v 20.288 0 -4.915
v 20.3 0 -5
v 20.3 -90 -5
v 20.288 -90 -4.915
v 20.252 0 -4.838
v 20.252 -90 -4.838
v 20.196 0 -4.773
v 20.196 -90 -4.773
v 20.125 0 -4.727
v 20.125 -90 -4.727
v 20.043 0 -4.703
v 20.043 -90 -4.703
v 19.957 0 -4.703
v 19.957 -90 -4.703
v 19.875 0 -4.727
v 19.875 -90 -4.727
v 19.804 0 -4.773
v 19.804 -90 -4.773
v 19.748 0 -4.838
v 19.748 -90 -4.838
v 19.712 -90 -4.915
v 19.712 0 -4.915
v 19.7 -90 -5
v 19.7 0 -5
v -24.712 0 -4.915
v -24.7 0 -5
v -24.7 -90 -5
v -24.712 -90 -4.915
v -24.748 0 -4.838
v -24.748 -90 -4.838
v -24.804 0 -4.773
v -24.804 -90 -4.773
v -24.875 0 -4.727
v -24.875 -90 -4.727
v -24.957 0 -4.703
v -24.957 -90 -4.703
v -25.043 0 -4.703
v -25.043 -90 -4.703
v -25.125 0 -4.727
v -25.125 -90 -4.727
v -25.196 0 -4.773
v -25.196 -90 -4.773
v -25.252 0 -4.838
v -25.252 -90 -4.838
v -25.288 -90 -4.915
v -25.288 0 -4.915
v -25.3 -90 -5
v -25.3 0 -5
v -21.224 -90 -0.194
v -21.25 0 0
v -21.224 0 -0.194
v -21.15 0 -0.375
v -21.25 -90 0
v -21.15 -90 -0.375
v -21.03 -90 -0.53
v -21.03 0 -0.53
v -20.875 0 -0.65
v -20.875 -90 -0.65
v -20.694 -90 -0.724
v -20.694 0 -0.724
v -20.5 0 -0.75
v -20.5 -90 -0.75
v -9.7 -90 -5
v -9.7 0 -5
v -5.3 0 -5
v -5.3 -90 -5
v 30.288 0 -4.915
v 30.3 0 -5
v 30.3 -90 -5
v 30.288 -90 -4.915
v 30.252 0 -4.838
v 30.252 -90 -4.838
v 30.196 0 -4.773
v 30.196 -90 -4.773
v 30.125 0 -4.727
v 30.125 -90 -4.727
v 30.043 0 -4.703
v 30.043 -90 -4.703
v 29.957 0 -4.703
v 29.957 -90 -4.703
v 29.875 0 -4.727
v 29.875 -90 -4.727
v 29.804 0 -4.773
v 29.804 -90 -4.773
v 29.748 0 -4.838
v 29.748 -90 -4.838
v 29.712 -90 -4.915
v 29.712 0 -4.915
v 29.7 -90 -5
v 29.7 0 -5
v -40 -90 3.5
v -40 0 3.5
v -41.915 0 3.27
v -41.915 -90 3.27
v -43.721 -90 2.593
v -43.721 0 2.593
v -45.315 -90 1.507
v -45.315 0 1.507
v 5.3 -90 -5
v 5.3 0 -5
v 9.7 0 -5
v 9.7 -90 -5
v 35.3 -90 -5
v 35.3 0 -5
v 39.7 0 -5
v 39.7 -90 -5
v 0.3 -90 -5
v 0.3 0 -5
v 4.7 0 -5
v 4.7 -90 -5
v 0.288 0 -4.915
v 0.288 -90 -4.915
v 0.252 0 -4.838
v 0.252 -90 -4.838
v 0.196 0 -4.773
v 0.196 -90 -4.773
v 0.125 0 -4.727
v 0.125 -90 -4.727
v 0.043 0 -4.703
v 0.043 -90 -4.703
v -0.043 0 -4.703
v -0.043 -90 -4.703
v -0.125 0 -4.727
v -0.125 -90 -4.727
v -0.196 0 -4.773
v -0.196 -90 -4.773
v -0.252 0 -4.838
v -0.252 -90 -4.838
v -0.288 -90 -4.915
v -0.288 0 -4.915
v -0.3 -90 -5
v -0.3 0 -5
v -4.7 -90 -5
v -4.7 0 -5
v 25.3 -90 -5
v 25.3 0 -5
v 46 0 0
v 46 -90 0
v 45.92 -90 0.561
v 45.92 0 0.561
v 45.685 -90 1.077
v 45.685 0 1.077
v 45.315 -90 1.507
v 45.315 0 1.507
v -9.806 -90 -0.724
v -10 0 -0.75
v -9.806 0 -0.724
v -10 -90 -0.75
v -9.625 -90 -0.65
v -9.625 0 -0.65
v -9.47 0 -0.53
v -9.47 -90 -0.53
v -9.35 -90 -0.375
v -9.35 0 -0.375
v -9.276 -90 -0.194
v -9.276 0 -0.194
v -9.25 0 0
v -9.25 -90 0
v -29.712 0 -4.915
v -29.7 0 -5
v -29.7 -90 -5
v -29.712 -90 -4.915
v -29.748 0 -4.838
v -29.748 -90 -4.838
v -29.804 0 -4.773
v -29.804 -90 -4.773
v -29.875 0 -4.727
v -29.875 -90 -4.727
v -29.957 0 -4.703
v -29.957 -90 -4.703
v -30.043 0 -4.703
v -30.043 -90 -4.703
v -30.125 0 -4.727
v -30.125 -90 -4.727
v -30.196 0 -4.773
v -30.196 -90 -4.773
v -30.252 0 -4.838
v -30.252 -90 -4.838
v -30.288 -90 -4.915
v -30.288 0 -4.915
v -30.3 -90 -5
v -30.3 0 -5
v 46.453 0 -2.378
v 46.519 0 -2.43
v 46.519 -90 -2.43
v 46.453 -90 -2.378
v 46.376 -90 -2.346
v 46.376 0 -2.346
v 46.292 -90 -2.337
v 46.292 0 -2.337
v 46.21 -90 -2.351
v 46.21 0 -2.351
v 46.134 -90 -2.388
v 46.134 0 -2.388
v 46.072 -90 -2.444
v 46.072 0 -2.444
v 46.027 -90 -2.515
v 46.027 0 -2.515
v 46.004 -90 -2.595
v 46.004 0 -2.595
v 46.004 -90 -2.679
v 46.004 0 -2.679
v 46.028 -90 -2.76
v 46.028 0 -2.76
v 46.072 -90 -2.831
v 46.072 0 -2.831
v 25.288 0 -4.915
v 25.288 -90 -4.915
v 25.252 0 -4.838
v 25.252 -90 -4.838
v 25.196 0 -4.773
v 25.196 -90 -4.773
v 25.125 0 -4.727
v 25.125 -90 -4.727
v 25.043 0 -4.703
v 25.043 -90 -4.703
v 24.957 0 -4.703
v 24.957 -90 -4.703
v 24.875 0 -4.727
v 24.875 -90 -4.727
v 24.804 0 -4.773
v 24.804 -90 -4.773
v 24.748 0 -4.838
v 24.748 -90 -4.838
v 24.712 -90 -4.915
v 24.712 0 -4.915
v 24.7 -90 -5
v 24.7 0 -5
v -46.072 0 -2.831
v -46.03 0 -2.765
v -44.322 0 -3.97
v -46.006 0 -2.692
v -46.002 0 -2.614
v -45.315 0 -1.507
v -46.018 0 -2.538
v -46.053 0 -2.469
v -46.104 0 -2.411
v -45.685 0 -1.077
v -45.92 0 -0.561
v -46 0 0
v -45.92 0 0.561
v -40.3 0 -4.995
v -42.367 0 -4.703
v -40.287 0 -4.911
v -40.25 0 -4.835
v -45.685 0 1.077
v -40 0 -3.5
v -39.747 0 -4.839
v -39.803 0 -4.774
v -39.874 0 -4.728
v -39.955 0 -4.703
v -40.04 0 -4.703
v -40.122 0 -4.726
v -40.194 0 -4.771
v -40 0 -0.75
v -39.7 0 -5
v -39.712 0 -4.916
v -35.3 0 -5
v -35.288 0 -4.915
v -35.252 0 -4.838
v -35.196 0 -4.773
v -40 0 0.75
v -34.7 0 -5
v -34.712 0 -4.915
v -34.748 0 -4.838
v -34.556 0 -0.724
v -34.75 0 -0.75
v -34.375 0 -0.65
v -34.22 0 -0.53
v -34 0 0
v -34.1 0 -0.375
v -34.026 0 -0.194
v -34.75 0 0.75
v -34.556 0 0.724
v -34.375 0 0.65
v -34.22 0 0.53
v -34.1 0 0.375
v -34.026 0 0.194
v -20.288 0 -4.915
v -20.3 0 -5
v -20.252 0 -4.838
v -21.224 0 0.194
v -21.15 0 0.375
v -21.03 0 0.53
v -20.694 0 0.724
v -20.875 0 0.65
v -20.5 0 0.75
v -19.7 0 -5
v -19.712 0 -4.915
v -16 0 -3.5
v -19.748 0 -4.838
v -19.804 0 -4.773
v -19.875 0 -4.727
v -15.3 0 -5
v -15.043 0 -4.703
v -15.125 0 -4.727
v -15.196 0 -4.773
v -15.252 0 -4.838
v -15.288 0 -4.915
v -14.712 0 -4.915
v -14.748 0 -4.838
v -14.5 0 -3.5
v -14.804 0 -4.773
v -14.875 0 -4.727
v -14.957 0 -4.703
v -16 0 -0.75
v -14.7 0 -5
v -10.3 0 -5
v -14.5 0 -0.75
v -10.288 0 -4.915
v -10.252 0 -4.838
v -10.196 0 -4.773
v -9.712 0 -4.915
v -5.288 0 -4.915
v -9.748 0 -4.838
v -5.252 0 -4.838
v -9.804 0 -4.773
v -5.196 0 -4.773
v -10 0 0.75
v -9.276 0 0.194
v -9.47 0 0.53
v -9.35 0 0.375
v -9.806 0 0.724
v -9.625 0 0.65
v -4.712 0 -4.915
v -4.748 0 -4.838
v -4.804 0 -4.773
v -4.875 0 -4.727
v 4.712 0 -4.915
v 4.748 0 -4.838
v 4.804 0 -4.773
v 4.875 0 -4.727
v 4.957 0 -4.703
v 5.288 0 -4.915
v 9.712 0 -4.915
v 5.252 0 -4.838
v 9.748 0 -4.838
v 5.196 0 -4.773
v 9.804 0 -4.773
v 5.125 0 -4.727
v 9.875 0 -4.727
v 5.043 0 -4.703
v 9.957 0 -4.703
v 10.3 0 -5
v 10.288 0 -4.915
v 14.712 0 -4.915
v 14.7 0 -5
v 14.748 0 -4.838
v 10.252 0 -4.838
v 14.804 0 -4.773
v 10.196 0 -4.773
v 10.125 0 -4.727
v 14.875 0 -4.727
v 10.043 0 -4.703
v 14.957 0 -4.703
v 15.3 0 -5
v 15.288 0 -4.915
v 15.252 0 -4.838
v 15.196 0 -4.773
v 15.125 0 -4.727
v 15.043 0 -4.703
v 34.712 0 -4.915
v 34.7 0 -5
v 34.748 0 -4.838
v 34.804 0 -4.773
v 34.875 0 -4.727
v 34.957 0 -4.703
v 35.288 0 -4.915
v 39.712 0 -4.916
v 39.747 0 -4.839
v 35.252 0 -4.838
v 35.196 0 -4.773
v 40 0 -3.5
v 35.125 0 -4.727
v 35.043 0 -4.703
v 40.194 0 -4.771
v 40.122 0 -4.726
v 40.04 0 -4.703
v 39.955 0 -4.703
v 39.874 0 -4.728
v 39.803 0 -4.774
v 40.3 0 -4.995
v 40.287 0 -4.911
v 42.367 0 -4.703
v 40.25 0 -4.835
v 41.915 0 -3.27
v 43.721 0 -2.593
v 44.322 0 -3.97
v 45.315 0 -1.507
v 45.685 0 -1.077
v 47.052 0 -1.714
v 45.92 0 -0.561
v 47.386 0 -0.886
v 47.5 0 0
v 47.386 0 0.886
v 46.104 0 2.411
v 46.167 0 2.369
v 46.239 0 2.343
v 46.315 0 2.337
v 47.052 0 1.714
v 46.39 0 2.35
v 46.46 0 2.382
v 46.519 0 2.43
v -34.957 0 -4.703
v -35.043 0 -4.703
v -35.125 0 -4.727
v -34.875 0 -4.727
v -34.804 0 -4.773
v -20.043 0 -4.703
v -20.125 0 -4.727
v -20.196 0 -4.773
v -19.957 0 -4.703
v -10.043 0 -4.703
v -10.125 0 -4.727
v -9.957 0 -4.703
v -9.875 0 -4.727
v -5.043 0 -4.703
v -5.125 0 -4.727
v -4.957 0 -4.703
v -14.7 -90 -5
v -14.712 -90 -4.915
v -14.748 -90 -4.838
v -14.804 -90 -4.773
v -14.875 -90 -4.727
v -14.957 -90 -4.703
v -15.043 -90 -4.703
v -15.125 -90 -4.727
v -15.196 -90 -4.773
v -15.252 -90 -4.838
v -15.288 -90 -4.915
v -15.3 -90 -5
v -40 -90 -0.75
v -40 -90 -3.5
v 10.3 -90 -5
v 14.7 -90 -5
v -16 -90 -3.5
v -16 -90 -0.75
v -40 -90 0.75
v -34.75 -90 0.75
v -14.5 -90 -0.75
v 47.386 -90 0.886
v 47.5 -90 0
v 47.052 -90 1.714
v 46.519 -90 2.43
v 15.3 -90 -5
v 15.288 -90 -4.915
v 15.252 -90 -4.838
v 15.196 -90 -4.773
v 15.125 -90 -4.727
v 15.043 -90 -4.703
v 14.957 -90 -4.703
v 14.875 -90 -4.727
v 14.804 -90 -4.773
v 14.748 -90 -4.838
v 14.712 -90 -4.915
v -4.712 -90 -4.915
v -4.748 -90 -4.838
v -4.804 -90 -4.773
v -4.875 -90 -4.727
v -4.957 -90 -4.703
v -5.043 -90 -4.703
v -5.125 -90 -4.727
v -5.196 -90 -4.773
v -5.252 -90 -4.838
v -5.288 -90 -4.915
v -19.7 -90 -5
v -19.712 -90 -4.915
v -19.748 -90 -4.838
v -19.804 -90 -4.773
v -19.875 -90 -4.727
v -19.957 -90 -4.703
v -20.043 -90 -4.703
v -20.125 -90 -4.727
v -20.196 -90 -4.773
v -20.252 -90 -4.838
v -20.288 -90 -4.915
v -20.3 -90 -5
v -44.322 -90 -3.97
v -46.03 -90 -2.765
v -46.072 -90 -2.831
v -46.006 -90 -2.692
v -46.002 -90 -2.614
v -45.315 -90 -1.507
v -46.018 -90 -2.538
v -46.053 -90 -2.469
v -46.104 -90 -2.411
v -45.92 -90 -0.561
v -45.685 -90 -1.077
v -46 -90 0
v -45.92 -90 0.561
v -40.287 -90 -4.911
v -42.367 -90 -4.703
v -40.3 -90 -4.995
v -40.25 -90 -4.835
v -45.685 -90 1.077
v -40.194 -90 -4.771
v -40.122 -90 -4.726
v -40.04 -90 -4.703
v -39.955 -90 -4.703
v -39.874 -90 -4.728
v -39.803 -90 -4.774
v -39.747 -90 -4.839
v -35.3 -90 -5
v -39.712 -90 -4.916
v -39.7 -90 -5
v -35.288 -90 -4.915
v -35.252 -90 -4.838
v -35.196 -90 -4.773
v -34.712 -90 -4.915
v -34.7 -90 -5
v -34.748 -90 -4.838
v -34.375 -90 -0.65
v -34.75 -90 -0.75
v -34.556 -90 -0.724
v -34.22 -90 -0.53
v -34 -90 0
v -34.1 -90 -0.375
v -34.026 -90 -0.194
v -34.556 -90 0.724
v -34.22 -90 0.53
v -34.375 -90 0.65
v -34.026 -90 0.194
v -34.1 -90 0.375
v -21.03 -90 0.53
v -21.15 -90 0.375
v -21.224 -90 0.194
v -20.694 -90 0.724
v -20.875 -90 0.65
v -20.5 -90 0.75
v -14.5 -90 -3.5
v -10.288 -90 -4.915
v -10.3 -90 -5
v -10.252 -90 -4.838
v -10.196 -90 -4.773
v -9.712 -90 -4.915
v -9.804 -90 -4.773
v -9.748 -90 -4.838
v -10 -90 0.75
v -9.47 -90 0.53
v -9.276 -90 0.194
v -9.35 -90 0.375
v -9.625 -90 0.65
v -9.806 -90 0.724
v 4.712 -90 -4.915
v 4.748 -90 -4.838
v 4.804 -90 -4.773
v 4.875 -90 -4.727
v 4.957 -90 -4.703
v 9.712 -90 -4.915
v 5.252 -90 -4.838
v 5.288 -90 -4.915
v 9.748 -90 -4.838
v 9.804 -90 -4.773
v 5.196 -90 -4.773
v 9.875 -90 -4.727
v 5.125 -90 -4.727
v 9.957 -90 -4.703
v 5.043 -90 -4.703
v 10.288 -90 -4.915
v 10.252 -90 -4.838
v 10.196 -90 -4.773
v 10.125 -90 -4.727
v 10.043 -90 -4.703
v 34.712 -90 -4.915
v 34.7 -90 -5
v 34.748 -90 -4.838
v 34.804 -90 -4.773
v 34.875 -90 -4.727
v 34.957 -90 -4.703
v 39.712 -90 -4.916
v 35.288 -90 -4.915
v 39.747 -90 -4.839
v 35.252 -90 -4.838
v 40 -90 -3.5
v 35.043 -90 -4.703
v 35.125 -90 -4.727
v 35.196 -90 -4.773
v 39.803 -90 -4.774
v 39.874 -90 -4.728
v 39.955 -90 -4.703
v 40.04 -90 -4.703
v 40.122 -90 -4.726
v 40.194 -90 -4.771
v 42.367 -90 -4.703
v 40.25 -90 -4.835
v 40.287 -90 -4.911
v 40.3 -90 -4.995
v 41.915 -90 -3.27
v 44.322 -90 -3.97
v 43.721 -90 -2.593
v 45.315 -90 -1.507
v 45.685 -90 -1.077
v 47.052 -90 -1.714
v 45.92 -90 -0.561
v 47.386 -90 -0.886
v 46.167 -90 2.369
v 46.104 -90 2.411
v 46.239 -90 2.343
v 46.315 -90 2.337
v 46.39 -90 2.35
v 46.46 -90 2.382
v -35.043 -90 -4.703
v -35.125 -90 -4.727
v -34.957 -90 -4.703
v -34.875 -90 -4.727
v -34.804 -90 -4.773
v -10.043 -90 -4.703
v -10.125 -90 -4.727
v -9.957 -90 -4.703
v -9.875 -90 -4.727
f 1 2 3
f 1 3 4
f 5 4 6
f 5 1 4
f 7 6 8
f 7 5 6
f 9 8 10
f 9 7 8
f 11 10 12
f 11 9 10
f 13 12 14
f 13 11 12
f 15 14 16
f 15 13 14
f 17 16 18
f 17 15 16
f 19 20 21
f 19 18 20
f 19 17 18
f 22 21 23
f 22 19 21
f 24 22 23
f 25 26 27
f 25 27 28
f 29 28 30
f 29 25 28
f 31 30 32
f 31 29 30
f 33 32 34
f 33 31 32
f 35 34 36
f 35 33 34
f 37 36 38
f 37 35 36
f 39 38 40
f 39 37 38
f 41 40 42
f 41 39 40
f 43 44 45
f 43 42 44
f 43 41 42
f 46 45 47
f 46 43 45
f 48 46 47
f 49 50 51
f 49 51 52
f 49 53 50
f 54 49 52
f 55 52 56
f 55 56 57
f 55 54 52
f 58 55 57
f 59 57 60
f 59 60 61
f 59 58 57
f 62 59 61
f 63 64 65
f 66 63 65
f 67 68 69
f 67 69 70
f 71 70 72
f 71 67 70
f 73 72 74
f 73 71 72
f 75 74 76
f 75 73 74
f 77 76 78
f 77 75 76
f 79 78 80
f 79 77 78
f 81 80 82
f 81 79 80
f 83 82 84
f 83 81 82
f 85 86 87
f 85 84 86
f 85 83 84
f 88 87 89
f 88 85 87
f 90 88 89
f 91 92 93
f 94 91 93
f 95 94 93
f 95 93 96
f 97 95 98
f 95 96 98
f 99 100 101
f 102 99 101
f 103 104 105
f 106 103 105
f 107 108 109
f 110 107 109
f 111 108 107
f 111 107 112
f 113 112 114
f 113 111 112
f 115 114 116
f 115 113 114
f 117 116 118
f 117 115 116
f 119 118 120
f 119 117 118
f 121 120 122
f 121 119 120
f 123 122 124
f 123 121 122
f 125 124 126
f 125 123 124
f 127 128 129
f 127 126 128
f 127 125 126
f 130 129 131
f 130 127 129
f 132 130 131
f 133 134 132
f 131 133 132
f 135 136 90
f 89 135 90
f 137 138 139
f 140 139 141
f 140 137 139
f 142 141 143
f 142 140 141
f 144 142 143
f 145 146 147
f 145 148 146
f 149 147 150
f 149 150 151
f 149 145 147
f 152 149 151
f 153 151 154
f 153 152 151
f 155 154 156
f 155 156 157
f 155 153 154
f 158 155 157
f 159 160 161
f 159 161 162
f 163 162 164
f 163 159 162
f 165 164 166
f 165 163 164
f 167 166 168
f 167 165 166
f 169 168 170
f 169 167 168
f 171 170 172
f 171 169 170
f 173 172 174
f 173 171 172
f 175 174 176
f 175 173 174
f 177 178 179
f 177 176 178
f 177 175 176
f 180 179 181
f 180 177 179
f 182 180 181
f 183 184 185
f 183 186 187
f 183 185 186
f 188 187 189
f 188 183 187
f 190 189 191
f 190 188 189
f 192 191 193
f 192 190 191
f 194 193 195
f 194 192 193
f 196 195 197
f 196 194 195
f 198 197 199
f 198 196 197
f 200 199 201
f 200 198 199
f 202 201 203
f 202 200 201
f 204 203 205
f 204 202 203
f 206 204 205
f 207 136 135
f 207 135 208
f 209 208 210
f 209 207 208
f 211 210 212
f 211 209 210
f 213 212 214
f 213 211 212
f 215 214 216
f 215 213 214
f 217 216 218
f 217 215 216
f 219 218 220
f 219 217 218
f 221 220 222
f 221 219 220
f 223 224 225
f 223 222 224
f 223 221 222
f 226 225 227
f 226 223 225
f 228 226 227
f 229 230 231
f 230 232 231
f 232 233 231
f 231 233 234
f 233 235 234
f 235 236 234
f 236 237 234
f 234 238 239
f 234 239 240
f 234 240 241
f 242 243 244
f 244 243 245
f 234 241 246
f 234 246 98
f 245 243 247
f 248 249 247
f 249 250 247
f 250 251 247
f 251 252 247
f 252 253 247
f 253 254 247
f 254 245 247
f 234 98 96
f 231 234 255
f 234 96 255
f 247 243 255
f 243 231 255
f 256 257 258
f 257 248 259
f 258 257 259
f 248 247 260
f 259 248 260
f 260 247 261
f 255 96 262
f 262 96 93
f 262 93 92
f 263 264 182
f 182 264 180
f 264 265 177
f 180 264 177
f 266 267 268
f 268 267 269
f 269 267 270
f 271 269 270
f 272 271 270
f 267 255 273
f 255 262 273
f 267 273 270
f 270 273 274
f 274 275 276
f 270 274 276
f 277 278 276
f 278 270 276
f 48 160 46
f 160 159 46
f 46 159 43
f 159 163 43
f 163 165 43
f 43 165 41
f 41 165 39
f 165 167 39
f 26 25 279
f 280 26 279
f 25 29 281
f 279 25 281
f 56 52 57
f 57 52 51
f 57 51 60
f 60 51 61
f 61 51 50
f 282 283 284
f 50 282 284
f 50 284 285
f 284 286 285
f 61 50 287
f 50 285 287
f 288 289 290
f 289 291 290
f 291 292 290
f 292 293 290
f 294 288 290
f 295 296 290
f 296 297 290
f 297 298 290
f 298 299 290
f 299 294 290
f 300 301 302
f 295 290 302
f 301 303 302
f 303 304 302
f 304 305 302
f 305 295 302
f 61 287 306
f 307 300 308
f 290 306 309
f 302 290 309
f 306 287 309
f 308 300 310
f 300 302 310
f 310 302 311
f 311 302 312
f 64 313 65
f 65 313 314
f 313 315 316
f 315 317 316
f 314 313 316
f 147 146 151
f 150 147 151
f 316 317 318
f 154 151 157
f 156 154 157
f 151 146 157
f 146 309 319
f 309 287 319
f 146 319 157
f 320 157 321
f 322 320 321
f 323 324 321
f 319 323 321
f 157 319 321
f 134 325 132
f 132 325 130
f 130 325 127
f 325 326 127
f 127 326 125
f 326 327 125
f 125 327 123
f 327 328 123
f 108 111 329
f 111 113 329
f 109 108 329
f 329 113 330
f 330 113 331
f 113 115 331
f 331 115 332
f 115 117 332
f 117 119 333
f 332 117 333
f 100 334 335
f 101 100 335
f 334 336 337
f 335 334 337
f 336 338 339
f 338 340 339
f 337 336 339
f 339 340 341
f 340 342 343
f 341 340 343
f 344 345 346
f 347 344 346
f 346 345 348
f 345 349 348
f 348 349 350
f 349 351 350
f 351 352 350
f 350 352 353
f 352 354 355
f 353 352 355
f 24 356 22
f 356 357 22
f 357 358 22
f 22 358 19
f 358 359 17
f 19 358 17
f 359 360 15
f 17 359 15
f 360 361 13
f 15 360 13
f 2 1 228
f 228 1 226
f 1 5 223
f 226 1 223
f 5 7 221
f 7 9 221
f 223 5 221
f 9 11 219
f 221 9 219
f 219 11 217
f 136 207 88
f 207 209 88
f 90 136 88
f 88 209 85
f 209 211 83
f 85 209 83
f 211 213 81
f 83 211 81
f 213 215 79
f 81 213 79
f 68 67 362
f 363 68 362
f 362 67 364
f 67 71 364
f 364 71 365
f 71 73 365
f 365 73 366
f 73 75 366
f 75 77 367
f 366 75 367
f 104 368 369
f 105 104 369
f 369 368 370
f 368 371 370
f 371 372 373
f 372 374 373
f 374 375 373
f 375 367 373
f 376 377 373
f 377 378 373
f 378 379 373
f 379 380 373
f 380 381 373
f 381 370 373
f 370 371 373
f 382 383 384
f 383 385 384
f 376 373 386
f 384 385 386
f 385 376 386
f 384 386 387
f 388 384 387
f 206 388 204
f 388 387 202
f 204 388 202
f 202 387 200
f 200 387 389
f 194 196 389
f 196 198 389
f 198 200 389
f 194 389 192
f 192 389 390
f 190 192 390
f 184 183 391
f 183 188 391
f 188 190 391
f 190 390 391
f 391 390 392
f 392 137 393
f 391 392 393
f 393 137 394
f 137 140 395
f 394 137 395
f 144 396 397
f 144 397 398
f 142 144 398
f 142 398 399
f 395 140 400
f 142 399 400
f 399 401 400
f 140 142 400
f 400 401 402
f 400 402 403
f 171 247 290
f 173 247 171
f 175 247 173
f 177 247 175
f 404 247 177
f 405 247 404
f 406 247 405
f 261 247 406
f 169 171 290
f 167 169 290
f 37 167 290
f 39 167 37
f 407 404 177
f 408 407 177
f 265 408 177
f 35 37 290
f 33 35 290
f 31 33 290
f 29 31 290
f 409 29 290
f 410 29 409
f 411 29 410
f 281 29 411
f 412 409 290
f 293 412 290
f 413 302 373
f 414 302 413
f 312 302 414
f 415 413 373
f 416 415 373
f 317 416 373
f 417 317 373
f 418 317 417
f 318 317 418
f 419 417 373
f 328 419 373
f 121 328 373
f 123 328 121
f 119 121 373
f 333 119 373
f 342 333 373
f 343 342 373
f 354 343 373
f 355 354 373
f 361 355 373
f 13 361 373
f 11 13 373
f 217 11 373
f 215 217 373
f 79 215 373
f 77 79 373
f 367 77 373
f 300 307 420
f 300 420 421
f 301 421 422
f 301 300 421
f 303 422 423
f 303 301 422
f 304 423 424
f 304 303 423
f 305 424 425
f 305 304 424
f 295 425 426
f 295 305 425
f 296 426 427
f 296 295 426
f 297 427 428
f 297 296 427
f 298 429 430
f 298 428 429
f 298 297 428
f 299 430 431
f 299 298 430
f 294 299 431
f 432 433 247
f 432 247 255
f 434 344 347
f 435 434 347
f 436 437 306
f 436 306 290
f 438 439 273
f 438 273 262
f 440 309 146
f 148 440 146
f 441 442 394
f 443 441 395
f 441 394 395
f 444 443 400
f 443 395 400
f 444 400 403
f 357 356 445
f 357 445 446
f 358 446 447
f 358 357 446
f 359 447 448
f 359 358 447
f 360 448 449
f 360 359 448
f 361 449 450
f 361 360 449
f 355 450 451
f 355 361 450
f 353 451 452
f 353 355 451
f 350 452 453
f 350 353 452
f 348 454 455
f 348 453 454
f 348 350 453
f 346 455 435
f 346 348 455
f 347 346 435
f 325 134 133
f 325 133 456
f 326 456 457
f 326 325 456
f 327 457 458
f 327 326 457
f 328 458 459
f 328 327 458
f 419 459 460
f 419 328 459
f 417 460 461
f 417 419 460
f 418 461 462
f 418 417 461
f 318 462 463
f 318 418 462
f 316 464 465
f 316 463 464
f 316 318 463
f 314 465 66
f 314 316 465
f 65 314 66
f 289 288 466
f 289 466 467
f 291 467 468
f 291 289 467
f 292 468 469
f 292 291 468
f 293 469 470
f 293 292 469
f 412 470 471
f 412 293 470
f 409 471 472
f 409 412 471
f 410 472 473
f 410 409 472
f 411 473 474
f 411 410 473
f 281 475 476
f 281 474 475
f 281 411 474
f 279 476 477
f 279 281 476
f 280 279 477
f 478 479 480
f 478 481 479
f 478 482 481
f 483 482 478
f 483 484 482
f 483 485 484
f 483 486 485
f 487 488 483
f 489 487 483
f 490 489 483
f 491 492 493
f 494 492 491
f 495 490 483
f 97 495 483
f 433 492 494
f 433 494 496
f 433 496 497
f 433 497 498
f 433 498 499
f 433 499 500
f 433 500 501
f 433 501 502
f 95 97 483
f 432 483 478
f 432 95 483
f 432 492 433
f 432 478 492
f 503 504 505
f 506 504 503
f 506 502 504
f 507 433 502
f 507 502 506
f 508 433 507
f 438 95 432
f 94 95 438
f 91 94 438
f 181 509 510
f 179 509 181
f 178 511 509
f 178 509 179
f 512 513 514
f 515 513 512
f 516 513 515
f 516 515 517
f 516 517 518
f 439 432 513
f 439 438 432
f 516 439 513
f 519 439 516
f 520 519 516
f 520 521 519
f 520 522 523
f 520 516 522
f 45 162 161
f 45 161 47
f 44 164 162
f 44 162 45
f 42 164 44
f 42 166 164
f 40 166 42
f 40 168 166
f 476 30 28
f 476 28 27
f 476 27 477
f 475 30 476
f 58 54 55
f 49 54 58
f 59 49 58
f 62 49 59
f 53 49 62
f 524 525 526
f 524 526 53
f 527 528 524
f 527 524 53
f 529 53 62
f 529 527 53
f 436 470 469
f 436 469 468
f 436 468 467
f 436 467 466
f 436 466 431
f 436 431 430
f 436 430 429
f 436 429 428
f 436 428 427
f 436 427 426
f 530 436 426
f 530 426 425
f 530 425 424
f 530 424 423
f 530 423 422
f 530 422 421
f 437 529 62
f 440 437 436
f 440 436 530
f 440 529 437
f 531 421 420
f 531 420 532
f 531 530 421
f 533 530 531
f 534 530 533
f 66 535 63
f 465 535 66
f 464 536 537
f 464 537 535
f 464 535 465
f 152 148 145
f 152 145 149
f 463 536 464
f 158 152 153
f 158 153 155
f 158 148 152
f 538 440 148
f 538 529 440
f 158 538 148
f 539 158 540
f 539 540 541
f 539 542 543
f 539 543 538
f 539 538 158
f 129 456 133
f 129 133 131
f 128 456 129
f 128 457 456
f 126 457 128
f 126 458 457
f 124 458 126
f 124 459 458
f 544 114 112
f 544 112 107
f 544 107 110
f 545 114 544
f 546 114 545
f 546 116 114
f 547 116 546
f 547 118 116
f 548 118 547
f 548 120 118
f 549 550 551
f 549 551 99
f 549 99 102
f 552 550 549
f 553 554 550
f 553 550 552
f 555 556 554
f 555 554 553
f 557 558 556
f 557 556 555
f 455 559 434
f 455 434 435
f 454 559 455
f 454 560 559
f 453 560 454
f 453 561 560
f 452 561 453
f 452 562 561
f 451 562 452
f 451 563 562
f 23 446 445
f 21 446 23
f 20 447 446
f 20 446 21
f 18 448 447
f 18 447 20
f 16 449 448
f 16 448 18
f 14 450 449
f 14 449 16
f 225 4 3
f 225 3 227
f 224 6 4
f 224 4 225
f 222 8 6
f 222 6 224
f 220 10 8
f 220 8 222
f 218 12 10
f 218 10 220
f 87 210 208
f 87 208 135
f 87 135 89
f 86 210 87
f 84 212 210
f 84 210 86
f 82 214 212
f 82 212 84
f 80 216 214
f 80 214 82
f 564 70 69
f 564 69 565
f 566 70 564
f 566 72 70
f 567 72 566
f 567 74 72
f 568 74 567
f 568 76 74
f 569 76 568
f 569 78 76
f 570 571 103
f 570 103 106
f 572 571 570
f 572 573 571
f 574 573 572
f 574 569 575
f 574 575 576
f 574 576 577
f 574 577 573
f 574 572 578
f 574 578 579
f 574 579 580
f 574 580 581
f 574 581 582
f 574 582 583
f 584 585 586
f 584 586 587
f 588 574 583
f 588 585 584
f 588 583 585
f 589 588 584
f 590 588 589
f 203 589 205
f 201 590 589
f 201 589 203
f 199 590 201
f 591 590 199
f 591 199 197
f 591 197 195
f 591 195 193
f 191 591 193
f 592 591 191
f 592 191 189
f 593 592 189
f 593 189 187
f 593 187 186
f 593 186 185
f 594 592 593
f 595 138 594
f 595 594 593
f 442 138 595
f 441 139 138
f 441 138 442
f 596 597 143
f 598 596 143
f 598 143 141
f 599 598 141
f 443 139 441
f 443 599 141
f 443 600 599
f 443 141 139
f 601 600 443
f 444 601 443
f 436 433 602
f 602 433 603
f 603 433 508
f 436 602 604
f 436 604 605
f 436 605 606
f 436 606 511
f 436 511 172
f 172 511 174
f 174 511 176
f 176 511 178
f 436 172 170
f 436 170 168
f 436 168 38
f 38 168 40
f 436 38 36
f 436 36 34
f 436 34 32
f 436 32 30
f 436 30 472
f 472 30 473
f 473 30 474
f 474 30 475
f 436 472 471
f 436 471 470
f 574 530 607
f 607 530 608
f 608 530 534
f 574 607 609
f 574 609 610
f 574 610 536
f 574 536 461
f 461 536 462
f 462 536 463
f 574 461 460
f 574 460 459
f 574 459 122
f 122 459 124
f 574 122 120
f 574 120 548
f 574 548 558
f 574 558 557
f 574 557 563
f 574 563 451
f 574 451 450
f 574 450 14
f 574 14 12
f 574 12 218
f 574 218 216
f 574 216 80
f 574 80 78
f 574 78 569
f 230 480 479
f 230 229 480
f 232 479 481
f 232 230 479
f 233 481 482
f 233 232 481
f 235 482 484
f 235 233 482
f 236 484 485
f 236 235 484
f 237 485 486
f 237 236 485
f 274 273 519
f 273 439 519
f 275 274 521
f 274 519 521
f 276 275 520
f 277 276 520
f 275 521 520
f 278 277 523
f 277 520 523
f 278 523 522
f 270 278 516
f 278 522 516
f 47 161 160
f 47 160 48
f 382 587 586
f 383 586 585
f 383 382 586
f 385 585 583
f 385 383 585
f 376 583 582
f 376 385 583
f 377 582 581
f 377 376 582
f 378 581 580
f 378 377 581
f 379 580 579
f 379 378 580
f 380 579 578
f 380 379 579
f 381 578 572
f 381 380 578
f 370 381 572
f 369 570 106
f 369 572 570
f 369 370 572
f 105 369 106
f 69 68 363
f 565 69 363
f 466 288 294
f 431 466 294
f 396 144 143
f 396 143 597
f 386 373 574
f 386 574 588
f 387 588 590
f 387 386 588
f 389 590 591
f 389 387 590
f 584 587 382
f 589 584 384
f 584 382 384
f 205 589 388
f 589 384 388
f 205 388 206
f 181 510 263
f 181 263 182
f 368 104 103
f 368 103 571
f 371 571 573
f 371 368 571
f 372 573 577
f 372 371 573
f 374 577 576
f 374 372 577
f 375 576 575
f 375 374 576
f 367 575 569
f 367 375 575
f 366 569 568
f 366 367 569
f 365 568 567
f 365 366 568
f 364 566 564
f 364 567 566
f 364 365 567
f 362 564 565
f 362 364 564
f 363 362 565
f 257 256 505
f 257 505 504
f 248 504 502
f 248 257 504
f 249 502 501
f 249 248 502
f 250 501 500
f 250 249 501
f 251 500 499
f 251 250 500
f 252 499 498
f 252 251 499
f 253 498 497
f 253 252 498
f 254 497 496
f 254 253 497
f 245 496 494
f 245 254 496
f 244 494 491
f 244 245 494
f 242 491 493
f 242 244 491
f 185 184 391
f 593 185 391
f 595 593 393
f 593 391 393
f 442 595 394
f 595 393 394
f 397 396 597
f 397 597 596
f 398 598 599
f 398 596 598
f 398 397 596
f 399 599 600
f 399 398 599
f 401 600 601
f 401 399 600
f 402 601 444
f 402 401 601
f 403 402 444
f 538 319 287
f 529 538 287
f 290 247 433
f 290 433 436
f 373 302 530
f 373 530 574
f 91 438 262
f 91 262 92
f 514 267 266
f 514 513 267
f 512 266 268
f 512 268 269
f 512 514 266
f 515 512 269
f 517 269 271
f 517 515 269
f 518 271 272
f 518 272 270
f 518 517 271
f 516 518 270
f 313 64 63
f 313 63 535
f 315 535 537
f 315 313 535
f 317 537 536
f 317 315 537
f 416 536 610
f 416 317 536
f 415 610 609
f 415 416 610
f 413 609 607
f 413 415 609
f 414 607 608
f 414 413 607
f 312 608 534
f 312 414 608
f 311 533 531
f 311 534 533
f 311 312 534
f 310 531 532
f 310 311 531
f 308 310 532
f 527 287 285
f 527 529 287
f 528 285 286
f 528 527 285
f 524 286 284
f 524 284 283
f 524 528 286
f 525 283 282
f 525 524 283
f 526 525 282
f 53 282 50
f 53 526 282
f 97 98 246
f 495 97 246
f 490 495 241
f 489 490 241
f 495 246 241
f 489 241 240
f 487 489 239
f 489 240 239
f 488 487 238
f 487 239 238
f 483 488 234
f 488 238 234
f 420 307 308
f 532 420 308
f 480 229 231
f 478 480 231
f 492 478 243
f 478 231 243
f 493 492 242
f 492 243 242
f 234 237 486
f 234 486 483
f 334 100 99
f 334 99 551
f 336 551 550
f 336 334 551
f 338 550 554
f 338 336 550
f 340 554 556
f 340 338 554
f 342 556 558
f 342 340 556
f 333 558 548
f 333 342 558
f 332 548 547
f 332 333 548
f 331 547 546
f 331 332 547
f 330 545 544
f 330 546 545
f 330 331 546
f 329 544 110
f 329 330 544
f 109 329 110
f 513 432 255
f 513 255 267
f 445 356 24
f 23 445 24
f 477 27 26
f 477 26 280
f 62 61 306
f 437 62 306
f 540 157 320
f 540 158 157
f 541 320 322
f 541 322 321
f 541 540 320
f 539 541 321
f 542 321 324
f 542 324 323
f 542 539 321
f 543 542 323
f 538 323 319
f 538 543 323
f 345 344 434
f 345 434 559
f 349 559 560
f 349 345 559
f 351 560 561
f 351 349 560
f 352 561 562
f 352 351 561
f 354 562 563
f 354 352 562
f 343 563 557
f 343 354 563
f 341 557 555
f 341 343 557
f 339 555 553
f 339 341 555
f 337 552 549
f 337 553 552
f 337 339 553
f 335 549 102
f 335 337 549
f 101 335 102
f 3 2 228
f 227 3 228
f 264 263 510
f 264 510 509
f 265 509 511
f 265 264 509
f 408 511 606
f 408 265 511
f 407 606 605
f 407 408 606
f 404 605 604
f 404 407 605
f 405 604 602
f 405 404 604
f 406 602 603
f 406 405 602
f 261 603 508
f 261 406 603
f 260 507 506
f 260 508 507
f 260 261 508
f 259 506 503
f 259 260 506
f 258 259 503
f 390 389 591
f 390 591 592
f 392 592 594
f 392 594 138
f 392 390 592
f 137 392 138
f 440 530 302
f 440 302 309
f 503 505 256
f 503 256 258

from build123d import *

# Parameters (mm, degrees)
F1_DEPTH  = 90
F2_T      = -1.5
F4_DEPTH  = 90.001
F6_DEPTH  = 90
F8_DEPTH  = 90
F9_R      = 0.74999
F10_R     = 0.3
F11_DEPTH = 90.001


# Not quite as in the source:
# - a fillet or chamfer is up to 0.001 mm smaller than in the source, because OpenCascade refuses the exact size


with BuildPart() as f1:
    # F0 (on Front) → F1 (new body)
    with BuildSketch(Plane.XZ):
        with BuildLine():
            Line((40, 5), (0, 5))
            Line((0, 5), (-40, 5))
            ThreePointArc((-40, 5), (-43.3649329819, 4.389821285), (-46.301369863, 2.6369863014))
            ThreePointArc((-46.301369863, 2.6369863014), (-47.1862826711, 1.4483103051), (-47.5, 0))
            ThreePointArc((-47.5, 0), (-47.1862826711, -1.4483103051), (-46.301369863, -2.6369863014))
            ThreePointArc((-46.301369863, -2.6369863014), (-43.3649329819, -4.389821285), (-40, -5))
            Line((-40, -5), (0, -5))
            Line((0, -5), (40, -5))
            ThreePointArc((40, -5), (43.3649329819, -4.389821285), (46.301369863, -2.6369863014))
            ThreePointArc((46.301369863, -2.6369863014), (47.1862826711, -1.4483103051), (47.5, 0))
            ThreePointArc((47.5, 0), (47.1862826711, 1.4483103051), (46.301369863, 2.6369863014))
            ThreePointArc((46.301369863, 2.6369863014), (43.3649329819, 4.389821285), (40, 5))
        make_face()
    extrude(amount=F1_DEPTH)

    # F2
    f2_openings = [f1.faces().sort_by_distance(p)[0] for p in [
        (0, -90, 0),
        (0, 0, 0),
    ]]
    offset(amount=F2_T, openings=f2_openings)

    # F3 (on Front) → F4 (cut, through all)
    with BuildSketch(Plane.XZ):
        Polygon((-44, 0), (44, 0), (52.7272727273, 10), (-47.5, 10), (-47.5, -4.0104166667), align=None)
    extrude(amount=F4_DEPTH, mode=Mode.SUBTRACT)

    # F5 (on Front) → F6 (join, through all)
    with BuildSketch(Plane.XZ):
        with BuildLine():
            ThreePointArc((-40, 3.5), (-42.8382478195, 2.9853275187), (-45.3150684932, 1.5068493151))
            ThreePointArc((-45.3150684932, 1.5068493151), (-46, 0), (-45.3150684932, -1.5068493151))
            ThreePointArc((-45.3150684932, -1.5068493151), (-42.8382478195, -2.9853275187), (-40, -3.5))
            Line((-40, -3.5), (-40, -0.75))
            Line((-40, -0.75), (-34, -0.75))
            Line((-34, -0.75), (-34, 0.75))
            Line((-34, 0.75), (-40, 0.75))
            Line((-40, 0.75), (-40, 3.5))
        make_face()
    extrude(amount=F6_DEPTH)

    # F7 (on Front) → F8 (join, through all)
    with BuildSketch(Plane.XZ):
        Polygon((-16, -0.75), (-16, -3.5), (-14.5, -3.5), (-14.5, -0.75), (-9.25, -0.75), (-9.25, 0.75), (-21.25, 0.75), (-21.25, -0.75), align=None)
    extrude(amount=F8_DEPTH)

    # F9 (radius 0.75 in the source; OpenCascade refuses exactly that, so slightly less here)
    f9_edges = [f1.edges().sort_by_distance(p)[0] for p in [
        (-34, -45, 0.75),
        (-34, -45, -0.75),
        (-9.25, -45, 0.75),
        (-9.25, -45, -0.75),
        (-21.25, -45, 0.75),
        (-21.25, -45, -0.75),
    ]]
    fillet(f9_edges, radius=F9_R)

    # F10 (on Front) → F11 (cut, through all)
    with BuildSketch(Plane.XZ):
        with Locations((40, -5)):
            Circle(F10_R)
        with Locations((35, -5)):
            Circle(F10_R)
        with Locations((30, -5)):
            Circle(F10_R)
        with Locations((25, -5)):
            Circle(F10_R)
        with Locations((20, -5)):
            Circle(F10_R)
        with Locations((15, -5)):
            Circle(F10_R)
        with Locations((10, -5)):
            Circle(F10_R)
        with Locations((5, -5)):
            Circle(F10_R)
        with Locations((0, -5)):
            Circle(F10_R)
        with Locations((46.301369863, -2.6369863014)):
            Circle(F10_R)
        with Locations((-5, -5)):
            Circle(F10_R)
        with Locations((-10, -5)):
            Circle(F10_R)
        with Locations((-15, -5)):
            Circle(F10_R)
        with Locations((-20, -5)):
            Circle(F10_R)
        with Locations((-25, -5)):
            Circle(F10_R)
        with Locations((-30, -5)):
            Circle(F10_R)
        with Locations((-35, -5)):
            Circle(F10_R)
        with Locations((-40, -5)):
            Circle(F10_R)
        with Locations((46.301369863, 2.6369863014)):
            Circle(F10_R)
        with Locations((-46.301369863, -2.6369863014)):
            Circle(F10_R)
    extrude(amount=F11_DEPTH, mode=Mode.SUBTRACT)


solid = f1.part
